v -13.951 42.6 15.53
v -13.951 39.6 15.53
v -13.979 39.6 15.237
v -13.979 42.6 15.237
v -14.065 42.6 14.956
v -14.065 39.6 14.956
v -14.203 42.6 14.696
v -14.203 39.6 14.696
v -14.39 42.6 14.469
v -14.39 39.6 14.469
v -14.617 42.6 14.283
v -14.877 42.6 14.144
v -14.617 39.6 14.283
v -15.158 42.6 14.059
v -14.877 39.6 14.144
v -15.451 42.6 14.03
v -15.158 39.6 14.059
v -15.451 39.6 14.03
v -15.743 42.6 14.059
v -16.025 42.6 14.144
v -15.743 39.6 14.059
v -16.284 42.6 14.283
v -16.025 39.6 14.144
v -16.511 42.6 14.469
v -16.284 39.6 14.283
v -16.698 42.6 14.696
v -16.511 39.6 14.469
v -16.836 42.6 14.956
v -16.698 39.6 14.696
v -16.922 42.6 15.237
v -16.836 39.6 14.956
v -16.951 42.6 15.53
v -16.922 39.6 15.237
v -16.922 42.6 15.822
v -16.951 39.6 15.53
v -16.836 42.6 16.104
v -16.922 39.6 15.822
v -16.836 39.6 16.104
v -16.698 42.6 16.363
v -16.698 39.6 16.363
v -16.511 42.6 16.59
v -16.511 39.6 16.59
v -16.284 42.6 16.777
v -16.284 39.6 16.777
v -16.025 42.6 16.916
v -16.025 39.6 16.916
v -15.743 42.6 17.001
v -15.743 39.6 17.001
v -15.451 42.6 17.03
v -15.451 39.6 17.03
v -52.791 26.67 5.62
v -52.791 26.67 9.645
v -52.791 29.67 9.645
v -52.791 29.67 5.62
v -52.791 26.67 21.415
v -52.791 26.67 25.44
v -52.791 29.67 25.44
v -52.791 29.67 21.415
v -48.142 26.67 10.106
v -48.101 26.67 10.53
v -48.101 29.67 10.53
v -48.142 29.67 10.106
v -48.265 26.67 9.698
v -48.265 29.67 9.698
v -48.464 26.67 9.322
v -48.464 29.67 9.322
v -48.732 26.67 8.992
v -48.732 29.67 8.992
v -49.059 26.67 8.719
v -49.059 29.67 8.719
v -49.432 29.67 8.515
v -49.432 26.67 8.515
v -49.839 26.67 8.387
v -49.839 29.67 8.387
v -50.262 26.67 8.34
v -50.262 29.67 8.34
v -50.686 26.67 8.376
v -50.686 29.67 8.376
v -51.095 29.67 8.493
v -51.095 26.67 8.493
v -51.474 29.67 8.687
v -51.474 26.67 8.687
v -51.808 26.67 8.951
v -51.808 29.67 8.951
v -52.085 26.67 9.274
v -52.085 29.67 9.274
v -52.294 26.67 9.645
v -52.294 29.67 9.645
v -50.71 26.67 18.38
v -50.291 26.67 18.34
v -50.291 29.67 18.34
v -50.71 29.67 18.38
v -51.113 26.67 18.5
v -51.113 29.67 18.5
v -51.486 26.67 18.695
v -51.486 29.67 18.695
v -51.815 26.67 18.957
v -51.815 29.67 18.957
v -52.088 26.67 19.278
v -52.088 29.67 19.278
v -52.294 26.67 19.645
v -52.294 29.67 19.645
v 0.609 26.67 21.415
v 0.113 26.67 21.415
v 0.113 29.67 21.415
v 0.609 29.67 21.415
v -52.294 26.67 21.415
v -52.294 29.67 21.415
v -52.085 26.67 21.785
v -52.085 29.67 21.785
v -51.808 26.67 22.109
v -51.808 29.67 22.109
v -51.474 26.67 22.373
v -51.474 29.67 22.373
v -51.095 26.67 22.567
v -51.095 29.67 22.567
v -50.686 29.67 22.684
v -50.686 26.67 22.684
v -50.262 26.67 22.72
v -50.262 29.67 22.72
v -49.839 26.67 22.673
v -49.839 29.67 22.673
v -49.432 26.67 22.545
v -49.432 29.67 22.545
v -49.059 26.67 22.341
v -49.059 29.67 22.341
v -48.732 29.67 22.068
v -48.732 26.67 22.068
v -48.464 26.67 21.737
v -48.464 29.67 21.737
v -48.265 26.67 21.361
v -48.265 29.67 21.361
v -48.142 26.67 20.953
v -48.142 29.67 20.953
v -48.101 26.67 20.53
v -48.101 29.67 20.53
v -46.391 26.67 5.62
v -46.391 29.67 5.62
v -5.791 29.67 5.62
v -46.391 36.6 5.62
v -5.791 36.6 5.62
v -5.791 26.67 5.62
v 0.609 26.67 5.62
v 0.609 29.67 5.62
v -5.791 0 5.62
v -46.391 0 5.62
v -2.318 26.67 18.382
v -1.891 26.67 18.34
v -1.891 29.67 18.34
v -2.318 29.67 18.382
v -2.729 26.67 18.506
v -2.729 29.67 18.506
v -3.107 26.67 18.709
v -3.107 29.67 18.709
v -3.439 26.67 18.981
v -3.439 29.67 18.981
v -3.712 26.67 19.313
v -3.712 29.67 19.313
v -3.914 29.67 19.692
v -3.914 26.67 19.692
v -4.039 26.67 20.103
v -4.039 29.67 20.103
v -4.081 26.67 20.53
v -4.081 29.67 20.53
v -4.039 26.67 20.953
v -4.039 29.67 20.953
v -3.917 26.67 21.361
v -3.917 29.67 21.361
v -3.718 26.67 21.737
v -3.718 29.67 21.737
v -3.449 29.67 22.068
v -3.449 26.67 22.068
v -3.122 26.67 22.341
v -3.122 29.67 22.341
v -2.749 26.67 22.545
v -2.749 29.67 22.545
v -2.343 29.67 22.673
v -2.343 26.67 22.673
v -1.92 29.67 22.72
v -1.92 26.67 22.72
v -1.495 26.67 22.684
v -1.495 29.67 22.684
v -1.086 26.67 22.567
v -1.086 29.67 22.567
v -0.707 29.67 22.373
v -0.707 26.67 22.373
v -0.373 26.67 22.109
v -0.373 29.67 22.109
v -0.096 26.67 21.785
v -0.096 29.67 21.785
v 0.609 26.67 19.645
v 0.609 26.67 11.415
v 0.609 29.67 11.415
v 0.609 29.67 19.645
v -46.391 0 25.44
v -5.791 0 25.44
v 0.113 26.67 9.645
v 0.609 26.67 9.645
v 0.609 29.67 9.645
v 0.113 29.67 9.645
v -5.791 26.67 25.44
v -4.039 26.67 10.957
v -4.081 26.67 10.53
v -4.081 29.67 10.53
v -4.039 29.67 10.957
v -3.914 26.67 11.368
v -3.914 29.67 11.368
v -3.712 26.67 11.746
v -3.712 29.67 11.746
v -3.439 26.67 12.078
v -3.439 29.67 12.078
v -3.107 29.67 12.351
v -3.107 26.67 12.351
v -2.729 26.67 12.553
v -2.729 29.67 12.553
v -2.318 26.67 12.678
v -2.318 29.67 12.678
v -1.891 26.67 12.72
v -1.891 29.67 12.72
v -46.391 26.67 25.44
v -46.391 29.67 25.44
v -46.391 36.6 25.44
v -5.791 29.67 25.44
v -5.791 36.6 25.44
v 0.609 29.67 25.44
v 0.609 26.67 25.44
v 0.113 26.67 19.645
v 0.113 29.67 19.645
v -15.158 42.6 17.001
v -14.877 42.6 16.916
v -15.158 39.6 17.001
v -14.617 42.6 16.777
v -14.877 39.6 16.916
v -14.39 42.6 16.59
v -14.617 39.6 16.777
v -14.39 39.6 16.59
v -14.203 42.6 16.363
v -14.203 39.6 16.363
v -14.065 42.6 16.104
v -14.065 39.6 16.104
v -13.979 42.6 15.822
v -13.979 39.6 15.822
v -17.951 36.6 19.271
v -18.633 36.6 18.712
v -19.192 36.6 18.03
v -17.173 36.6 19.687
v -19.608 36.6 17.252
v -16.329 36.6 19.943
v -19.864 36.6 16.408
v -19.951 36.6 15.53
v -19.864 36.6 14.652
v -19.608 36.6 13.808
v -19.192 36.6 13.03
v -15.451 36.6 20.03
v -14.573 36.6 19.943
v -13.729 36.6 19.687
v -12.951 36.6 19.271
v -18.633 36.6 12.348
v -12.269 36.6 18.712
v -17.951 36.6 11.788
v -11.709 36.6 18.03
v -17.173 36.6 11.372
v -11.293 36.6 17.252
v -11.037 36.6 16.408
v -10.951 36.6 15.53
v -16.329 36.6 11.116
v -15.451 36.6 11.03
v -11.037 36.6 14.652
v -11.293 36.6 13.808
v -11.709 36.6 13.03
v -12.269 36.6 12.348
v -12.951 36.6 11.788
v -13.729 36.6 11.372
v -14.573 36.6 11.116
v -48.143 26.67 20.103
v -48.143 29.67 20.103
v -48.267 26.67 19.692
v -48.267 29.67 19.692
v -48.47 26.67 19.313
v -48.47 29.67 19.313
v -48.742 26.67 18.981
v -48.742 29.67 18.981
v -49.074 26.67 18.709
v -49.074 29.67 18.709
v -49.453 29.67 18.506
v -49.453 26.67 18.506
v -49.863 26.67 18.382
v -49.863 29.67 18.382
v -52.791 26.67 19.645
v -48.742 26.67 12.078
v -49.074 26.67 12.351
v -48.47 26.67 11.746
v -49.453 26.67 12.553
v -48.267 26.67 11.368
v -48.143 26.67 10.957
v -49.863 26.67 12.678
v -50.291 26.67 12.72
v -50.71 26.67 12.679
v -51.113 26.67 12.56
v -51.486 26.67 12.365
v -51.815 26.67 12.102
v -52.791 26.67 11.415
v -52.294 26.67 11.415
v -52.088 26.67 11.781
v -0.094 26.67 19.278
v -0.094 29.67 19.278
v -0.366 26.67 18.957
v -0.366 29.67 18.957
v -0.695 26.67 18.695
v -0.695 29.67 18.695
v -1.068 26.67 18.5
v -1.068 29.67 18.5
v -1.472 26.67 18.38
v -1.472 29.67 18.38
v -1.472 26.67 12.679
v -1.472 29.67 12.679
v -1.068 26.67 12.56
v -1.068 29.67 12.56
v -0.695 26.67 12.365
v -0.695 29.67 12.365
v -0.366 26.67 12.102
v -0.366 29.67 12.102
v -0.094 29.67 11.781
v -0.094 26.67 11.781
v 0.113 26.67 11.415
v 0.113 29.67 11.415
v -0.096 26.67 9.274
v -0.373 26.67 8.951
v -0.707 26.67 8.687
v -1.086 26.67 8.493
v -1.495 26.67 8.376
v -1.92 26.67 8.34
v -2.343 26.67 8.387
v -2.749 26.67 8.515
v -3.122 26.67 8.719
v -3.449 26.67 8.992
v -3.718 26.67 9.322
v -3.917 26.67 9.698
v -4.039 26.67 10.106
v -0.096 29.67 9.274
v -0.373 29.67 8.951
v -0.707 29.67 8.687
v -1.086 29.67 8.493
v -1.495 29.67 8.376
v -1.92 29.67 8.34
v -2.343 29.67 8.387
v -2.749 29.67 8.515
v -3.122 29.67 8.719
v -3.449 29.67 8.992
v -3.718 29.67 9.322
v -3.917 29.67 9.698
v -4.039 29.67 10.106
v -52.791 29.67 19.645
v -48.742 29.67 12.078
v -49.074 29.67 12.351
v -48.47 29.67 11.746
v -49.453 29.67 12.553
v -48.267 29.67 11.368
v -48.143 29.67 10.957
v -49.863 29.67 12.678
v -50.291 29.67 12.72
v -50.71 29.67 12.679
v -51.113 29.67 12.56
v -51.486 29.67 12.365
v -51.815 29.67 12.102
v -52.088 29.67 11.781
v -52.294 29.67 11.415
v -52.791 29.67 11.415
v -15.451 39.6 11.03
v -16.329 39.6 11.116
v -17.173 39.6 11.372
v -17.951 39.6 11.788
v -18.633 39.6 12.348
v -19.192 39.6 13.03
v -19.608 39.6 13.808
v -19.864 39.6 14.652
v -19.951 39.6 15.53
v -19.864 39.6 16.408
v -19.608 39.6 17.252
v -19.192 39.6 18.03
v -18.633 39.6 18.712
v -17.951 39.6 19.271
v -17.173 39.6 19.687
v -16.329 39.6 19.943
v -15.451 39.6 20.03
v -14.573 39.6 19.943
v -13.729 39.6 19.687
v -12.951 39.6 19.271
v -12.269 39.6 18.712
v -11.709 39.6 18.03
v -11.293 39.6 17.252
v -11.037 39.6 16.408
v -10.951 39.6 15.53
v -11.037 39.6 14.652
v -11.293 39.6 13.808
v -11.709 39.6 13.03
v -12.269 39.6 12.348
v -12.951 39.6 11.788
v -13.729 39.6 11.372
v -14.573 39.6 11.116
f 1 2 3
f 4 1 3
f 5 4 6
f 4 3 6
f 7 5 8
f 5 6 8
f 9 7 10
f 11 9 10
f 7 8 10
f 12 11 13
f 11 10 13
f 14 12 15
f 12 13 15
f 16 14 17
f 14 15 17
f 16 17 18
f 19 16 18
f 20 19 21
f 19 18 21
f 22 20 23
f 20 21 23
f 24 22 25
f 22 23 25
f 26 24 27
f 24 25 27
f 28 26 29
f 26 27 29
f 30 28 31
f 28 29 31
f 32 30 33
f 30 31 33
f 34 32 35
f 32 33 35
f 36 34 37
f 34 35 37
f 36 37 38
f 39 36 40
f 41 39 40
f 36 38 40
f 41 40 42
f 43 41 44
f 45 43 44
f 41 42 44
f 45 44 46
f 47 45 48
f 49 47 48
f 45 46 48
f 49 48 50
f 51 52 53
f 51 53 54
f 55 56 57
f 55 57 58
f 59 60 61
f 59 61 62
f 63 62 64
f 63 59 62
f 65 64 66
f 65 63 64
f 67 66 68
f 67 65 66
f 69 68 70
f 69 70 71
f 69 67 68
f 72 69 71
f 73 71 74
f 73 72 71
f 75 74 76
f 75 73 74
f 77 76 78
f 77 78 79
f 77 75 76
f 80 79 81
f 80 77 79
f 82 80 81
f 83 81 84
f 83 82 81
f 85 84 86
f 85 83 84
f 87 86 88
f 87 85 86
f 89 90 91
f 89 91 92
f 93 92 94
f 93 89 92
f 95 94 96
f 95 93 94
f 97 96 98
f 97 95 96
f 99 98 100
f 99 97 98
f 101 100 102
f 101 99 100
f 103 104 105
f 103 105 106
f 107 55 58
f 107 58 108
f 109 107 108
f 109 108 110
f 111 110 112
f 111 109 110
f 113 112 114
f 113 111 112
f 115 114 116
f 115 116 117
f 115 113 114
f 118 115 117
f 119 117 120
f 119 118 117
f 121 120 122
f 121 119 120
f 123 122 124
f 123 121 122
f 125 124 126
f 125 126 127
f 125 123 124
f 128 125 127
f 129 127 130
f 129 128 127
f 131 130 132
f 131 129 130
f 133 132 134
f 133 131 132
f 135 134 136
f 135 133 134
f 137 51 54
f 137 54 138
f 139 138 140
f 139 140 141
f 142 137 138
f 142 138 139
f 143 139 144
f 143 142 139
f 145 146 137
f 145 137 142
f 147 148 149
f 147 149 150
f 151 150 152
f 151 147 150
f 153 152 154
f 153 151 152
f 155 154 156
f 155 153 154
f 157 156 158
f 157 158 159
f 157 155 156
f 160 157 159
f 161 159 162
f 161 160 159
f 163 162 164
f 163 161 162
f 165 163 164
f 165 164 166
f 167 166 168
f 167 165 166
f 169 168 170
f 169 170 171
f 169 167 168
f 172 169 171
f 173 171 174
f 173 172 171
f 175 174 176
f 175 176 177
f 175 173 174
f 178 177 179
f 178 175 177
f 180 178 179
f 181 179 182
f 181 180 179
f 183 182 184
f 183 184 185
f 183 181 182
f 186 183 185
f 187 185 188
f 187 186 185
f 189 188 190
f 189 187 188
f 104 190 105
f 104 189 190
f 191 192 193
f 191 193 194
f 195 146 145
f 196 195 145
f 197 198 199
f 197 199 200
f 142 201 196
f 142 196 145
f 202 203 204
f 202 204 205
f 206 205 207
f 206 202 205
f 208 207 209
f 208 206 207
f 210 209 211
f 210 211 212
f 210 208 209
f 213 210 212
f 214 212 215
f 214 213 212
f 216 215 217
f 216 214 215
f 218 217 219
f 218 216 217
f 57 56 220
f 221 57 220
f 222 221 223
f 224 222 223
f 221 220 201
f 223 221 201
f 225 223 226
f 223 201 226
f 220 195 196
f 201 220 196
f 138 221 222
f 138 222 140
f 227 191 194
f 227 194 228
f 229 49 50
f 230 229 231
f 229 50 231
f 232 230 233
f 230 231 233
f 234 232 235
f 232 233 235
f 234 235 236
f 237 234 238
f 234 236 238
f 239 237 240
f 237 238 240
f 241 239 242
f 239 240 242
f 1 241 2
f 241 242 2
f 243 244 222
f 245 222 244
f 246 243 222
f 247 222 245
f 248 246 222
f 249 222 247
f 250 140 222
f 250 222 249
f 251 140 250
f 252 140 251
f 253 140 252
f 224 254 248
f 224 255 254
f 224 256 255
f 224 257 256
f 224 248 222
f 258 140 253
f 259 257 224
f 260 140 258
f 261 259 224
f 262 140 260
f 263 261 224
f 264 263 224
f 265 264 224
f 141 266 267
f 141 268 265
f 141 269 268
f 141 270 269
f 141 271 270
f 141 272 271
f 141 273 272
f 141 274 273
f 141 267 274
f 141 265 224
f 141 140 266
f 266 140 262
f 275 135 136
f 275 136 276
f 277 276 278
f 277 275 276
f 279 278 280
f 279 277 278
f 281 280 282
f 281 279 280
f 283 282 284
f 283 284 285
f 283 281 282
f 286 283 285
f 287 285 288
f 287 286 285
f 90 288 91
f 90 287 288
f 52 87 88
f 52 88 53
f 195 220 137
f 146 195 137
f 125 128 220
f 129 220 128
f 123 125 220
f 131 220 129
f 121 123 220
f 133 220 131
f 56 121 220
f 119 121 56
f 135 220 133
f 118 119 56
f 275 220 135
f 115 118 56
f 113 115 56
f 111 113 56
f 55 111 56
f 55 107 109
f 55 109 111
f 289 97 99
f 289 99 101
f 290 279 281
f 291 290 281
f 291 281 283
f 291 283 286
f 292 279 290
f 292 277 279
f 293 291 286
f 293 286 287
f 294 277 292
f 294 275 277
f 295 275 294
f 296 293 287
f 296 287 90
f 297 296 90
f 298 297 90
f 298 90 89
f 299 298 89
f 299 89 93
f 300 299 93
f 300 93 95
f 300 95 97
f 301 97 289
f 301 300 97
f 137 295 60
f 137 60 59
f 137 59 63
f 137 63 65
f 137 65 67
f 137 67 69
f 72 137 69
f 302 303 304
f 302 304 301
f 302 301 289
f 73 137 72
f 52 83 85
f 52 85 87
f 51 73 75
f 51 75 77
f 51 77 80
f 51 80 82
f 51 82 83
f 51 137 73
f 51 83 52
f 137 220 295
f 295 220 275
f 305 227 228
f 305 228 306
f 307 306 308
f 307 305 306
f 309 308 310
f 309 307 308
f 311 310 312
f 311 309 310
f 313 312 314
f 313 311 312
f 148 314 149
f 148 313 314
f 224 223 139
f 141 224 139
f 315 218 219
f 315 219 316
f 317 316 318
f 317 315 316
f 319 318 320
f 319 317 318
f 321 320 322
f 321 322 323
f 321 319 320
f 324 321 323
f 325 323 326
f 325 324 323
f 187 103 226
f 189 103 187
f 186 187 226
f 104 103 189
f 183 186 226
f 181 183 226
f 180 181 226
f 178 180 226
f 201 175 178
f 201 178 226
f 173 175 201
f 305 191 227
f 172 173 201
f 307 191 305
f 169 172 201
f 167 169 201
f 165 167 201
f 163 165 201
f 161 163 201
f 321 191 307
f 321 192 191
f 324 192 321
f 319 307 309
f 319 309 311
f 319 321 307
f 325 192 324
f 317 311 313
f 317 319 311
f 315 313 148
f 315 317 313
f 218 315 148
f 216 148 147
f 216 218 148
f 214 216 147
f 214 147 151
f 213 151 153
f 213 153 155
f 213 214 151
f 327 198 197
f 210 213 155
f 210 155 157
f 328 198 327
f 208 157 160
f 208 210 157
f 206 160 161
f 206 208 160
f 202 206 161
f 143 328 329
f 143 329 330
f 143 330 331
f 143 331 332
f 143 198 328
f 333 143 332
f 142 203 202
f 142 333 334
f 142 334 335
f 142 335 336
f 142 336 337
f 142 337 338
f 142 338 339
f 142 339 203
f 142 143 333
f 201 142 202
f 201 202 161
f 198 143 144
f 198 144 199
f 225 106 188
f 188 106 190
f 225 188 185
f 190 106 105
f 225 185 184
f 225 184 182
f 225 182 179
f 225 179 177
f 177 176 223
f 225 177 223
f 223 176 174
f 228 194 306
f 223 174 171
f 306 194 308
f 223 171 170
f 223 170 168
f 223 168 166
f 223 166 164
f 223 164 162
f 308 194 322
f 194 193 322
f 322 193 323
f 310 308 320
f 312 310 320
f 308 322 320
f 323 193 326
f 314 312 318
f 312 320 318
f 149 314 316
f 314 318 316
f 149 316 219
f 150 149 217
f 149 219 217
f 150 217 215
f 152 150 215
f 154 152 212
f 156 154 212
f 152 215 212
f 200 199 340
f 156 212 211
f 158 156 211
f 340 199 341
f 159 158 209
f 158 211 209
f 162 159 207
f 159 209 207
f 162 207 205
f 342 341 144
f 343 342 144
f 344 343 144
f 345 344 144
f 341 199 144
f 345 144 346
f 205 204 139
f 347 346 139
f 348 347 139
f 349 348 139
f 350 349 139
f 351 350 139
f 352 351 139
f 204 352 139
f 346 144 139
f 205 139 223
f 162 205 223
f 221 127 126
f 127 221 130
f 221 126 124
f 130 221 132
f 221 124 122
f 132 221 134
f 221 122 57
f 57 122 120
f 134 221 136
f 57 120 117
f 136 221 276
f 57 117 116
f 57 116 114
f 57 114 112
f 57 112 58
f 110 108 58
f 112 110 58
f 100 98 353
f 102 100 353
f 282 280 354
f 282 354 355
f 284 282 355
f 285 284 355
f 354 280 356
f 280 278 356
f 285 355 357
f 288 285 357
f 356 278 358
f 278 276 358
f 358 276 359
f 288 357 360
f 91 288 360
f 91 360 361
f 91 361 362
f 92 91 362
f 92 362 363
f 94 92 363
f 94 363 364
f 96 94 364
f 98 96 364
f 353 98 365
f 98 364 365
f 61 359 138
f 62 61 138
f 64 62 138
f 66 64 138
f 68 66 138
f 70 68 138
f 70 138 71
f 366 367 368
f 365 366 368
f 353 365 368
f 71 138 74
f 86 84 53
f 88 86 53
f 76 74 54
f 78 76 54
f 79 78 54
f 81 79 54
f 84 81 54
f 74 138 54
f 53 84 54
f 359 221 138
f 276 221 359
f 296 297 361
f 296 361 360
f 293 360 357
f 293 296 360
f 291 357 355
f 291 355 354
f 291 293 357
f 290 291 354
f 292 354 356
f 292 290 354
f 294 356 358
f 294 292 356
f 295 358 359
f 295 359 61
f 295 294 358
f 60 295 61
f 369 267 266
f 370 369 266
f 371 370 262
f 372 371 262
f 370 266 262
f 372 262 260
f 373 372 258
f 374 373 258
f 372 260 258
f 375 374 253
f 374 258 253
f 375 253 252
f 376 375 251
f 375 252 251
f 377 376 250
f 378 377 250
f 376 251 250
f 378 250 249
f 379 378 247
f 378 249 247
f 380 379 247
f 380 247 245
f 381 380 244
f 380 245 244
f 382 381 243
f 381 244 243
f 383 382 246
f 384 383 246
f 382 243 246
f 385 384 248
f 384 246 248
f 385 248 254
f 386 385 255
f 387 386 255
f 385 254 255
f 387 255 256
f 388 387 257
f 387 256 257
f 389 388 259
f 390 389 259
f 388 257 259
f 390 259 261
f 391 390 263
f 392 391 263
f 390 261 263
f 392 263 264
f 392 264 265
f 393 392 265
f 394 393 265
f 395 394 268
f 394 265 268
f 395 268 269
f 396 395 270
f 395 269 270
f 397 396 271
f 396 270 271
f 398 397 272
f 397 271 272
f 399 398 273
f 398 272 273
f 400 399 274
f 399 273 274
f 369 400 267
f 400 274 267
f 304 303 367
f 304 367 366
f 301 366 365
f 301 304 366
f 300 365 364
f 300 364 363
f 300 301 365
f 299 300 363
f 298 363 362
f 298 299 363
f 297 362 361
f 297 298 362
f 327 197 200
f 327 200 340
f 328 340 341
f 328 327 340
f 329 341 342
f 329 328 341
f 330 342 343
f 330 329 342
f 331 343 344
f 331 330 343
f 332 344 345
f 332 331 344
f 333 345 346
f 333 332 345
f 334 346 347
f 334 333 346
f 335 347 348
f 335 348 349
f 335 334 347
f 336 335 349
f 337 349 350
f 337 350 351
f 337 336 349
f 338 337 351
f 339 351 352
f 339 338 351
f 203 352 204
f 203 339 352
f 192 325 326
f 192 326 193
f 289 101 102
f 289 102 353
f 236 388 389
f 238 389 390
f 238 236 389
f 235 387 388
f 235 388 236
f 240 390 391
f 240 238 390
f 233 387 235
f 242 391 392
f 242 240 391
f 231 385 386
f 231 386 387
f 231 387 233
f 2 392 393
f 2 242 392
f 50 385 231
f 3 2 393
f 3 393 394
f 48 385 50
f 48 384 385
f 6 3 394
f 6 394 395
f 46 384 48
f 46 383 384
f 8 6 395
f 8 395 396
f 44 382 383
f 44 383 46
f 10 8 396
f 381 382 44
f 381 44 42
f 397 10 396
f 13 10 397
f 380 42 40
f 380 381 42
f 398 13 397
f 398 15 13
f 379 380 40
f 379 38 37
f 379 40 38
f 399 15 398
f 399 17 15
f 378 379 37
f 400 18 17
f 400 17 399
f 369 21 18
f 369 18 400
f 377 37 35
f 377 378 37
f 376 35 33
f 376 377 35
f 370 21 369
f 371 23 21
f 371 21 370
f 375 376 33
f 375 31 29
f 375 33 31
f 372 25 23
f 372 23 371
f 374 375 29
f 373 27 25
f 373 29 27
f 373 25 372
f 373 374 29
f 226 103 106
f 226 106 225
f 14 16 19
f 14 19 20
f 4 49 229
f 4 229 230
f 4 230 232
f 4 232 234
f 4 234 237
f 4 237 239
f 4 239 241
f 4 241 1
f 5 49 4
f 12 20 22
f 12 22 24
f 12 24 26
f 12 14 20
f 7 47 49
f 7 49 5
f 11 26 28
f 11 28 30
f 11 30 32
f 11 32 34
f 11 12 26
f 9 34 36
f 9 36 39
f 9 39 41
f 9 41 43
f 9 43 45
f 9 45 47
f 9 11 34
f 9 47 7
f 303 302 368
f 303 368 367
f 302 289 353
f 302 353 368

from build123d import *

# Parameters (mm, degrees)
ESQUISSE2_W        = 40.6
ESQUISSE2_H        = 19.82
BOSS_EXTRU_1_DEPTH = 36.6
ESQUISSE5_R        = 1.5
BOSS_EXTRU_2_DEPTH = 6
BOSS_EXTRU_3_DEPTH = 3
ESQUISSE5_3_R      = 4.5
ESQUISSE5_3_R_2    = 1.5
BOSS_EXTRU_4_DEPTH = 3


with BuildPart() as part:
    # Esquisse2 → Boss.-Extru.1 (new body)
    with BuildSketch(Plane(origin=(0, 0, 0), x_dir=(1, 0, 0), z_dir=(0, 1, 0))):
        with Locations((-26.090639329, -15.529787325)):
            Rectangle(ESQUISSE2_W, ESQUISSE2_H)
    extrude(amount=BOSS_EXTRU_1_DEPTH)

    # Esquisse5 → Boss.-Extru.2 (add)
    with BuildSketch(Plane(origin=(0, 36.6, 0), x_dir=(1, 0, 0), z_dir=(0, 1, 0))):
        with Locations((-15.450639329, -15.529787325)):
            Circle(ESQUISSE5_R)
    extrude(amount=BOSS_EXTRU_2_DEPTH)

    # Esquisse12 → Boss.-Extru.3 (add)
    with BuildSketch(Plane(origin=(0, 26.67, 0), x_dir=(-1, 0, 0), z_dir=(0, -1, 0))):
        with BuildLine():
            Line((46.390639329, -25.439787325), (52.790639329, -25.439787325))
            Line((52.790639329, -25.439787325), (52.790639329, -21.414567223))
            Line((52.790639329, -21.414567223), (52.293952717, -21.414567223))
            ThreePointArc((52.293952717, -21.414567223), (48.100639329, -20.529787325), (52.293952717, -19.645007427))
            Line((52.293952717, -19.645007427), (52.790639329, -19.645007427))
            Line((52.790639329, -19.645007427), (52.790639329, -11.414567223))
            Line((52.790639329, -11.414567223), (52.293952717, -11.414567223))
            ThreePointArc((52.293952717, -11.414567223), (48.100639329, -10.529787325), (52.293952717, -9.645007427))
            Line((52.293952717, -9.645007427), (52.790639329, -9.645007427))
            Line((52.790639329, -9.645007427), (52.790639329, -5.619787325))
            Line((52.790639329, -5.619787325), (46.390639329, -5.619787325))
            Line((46.390639329, -5.619787325), (46.390639329, -25.439787325))
        make_face()
        with BuildLine():
            Line((5.790639329, -25.439787325), (5.790639329, -5.619787325))
            Line((5.790639329, -5.619787325), (-0.609360671, -5.619787325))
            Line((-0.609360671, -5.619787325), (-0.609360671, -9.645007427))
            Line((-0.609360671, -9.645007427), (-0.112674059, -9.645007427))
            ThreePointArc((-0.112674059, -9.645007427), (4.080639329, -10.529787325), (-0.112674059, -11.414567223))
            Line((-0.112674059, -11.414567223), (-0.609360671, -11.414567223))
            Line((-0.609360671, -11.414567223), (-0.609360671, -19.645007427))
            Line((-0.609360671, -19.645007427), (-0.112674059, -19.645007427))
            ThreePointArc((-0.112674059, -19.645007427), (4.080639329, -20.529787325), (-0.112674059, -21.414567223))
            Line((-0.112674059, -21.414567223), (-0.609360671, -21.414567223))
            Line((-0.609360671, -21.414567223), (-0.609360671, -25.439787325))
            Line((-0.609360671, -25.439787325), (5.790639329, -25.439787325))
        make_face()
    extrude(amount=-BOSS_EXTRU_3_DEPTH)

    # Esquisse5<3> → Boss.-Extru.4 (add)
    with BuildSketch(Plane(origin=(0, 36.6, 0), x_dir=(1, 0, 0), z_dir=(0, 1, 0))):
        with Locations((-15.450639329, -15.529787325)):
            Circle(ESQUISSE5_3_R)
        with Locations((-15.450639329, -15.529787325)):
            Circle(ESQUISSE5_3_R_2, mode=Mode.SUBTRACT)
    extrude(amount=BOSS_EXTRU_4_DEPTH)


solid = part.part
